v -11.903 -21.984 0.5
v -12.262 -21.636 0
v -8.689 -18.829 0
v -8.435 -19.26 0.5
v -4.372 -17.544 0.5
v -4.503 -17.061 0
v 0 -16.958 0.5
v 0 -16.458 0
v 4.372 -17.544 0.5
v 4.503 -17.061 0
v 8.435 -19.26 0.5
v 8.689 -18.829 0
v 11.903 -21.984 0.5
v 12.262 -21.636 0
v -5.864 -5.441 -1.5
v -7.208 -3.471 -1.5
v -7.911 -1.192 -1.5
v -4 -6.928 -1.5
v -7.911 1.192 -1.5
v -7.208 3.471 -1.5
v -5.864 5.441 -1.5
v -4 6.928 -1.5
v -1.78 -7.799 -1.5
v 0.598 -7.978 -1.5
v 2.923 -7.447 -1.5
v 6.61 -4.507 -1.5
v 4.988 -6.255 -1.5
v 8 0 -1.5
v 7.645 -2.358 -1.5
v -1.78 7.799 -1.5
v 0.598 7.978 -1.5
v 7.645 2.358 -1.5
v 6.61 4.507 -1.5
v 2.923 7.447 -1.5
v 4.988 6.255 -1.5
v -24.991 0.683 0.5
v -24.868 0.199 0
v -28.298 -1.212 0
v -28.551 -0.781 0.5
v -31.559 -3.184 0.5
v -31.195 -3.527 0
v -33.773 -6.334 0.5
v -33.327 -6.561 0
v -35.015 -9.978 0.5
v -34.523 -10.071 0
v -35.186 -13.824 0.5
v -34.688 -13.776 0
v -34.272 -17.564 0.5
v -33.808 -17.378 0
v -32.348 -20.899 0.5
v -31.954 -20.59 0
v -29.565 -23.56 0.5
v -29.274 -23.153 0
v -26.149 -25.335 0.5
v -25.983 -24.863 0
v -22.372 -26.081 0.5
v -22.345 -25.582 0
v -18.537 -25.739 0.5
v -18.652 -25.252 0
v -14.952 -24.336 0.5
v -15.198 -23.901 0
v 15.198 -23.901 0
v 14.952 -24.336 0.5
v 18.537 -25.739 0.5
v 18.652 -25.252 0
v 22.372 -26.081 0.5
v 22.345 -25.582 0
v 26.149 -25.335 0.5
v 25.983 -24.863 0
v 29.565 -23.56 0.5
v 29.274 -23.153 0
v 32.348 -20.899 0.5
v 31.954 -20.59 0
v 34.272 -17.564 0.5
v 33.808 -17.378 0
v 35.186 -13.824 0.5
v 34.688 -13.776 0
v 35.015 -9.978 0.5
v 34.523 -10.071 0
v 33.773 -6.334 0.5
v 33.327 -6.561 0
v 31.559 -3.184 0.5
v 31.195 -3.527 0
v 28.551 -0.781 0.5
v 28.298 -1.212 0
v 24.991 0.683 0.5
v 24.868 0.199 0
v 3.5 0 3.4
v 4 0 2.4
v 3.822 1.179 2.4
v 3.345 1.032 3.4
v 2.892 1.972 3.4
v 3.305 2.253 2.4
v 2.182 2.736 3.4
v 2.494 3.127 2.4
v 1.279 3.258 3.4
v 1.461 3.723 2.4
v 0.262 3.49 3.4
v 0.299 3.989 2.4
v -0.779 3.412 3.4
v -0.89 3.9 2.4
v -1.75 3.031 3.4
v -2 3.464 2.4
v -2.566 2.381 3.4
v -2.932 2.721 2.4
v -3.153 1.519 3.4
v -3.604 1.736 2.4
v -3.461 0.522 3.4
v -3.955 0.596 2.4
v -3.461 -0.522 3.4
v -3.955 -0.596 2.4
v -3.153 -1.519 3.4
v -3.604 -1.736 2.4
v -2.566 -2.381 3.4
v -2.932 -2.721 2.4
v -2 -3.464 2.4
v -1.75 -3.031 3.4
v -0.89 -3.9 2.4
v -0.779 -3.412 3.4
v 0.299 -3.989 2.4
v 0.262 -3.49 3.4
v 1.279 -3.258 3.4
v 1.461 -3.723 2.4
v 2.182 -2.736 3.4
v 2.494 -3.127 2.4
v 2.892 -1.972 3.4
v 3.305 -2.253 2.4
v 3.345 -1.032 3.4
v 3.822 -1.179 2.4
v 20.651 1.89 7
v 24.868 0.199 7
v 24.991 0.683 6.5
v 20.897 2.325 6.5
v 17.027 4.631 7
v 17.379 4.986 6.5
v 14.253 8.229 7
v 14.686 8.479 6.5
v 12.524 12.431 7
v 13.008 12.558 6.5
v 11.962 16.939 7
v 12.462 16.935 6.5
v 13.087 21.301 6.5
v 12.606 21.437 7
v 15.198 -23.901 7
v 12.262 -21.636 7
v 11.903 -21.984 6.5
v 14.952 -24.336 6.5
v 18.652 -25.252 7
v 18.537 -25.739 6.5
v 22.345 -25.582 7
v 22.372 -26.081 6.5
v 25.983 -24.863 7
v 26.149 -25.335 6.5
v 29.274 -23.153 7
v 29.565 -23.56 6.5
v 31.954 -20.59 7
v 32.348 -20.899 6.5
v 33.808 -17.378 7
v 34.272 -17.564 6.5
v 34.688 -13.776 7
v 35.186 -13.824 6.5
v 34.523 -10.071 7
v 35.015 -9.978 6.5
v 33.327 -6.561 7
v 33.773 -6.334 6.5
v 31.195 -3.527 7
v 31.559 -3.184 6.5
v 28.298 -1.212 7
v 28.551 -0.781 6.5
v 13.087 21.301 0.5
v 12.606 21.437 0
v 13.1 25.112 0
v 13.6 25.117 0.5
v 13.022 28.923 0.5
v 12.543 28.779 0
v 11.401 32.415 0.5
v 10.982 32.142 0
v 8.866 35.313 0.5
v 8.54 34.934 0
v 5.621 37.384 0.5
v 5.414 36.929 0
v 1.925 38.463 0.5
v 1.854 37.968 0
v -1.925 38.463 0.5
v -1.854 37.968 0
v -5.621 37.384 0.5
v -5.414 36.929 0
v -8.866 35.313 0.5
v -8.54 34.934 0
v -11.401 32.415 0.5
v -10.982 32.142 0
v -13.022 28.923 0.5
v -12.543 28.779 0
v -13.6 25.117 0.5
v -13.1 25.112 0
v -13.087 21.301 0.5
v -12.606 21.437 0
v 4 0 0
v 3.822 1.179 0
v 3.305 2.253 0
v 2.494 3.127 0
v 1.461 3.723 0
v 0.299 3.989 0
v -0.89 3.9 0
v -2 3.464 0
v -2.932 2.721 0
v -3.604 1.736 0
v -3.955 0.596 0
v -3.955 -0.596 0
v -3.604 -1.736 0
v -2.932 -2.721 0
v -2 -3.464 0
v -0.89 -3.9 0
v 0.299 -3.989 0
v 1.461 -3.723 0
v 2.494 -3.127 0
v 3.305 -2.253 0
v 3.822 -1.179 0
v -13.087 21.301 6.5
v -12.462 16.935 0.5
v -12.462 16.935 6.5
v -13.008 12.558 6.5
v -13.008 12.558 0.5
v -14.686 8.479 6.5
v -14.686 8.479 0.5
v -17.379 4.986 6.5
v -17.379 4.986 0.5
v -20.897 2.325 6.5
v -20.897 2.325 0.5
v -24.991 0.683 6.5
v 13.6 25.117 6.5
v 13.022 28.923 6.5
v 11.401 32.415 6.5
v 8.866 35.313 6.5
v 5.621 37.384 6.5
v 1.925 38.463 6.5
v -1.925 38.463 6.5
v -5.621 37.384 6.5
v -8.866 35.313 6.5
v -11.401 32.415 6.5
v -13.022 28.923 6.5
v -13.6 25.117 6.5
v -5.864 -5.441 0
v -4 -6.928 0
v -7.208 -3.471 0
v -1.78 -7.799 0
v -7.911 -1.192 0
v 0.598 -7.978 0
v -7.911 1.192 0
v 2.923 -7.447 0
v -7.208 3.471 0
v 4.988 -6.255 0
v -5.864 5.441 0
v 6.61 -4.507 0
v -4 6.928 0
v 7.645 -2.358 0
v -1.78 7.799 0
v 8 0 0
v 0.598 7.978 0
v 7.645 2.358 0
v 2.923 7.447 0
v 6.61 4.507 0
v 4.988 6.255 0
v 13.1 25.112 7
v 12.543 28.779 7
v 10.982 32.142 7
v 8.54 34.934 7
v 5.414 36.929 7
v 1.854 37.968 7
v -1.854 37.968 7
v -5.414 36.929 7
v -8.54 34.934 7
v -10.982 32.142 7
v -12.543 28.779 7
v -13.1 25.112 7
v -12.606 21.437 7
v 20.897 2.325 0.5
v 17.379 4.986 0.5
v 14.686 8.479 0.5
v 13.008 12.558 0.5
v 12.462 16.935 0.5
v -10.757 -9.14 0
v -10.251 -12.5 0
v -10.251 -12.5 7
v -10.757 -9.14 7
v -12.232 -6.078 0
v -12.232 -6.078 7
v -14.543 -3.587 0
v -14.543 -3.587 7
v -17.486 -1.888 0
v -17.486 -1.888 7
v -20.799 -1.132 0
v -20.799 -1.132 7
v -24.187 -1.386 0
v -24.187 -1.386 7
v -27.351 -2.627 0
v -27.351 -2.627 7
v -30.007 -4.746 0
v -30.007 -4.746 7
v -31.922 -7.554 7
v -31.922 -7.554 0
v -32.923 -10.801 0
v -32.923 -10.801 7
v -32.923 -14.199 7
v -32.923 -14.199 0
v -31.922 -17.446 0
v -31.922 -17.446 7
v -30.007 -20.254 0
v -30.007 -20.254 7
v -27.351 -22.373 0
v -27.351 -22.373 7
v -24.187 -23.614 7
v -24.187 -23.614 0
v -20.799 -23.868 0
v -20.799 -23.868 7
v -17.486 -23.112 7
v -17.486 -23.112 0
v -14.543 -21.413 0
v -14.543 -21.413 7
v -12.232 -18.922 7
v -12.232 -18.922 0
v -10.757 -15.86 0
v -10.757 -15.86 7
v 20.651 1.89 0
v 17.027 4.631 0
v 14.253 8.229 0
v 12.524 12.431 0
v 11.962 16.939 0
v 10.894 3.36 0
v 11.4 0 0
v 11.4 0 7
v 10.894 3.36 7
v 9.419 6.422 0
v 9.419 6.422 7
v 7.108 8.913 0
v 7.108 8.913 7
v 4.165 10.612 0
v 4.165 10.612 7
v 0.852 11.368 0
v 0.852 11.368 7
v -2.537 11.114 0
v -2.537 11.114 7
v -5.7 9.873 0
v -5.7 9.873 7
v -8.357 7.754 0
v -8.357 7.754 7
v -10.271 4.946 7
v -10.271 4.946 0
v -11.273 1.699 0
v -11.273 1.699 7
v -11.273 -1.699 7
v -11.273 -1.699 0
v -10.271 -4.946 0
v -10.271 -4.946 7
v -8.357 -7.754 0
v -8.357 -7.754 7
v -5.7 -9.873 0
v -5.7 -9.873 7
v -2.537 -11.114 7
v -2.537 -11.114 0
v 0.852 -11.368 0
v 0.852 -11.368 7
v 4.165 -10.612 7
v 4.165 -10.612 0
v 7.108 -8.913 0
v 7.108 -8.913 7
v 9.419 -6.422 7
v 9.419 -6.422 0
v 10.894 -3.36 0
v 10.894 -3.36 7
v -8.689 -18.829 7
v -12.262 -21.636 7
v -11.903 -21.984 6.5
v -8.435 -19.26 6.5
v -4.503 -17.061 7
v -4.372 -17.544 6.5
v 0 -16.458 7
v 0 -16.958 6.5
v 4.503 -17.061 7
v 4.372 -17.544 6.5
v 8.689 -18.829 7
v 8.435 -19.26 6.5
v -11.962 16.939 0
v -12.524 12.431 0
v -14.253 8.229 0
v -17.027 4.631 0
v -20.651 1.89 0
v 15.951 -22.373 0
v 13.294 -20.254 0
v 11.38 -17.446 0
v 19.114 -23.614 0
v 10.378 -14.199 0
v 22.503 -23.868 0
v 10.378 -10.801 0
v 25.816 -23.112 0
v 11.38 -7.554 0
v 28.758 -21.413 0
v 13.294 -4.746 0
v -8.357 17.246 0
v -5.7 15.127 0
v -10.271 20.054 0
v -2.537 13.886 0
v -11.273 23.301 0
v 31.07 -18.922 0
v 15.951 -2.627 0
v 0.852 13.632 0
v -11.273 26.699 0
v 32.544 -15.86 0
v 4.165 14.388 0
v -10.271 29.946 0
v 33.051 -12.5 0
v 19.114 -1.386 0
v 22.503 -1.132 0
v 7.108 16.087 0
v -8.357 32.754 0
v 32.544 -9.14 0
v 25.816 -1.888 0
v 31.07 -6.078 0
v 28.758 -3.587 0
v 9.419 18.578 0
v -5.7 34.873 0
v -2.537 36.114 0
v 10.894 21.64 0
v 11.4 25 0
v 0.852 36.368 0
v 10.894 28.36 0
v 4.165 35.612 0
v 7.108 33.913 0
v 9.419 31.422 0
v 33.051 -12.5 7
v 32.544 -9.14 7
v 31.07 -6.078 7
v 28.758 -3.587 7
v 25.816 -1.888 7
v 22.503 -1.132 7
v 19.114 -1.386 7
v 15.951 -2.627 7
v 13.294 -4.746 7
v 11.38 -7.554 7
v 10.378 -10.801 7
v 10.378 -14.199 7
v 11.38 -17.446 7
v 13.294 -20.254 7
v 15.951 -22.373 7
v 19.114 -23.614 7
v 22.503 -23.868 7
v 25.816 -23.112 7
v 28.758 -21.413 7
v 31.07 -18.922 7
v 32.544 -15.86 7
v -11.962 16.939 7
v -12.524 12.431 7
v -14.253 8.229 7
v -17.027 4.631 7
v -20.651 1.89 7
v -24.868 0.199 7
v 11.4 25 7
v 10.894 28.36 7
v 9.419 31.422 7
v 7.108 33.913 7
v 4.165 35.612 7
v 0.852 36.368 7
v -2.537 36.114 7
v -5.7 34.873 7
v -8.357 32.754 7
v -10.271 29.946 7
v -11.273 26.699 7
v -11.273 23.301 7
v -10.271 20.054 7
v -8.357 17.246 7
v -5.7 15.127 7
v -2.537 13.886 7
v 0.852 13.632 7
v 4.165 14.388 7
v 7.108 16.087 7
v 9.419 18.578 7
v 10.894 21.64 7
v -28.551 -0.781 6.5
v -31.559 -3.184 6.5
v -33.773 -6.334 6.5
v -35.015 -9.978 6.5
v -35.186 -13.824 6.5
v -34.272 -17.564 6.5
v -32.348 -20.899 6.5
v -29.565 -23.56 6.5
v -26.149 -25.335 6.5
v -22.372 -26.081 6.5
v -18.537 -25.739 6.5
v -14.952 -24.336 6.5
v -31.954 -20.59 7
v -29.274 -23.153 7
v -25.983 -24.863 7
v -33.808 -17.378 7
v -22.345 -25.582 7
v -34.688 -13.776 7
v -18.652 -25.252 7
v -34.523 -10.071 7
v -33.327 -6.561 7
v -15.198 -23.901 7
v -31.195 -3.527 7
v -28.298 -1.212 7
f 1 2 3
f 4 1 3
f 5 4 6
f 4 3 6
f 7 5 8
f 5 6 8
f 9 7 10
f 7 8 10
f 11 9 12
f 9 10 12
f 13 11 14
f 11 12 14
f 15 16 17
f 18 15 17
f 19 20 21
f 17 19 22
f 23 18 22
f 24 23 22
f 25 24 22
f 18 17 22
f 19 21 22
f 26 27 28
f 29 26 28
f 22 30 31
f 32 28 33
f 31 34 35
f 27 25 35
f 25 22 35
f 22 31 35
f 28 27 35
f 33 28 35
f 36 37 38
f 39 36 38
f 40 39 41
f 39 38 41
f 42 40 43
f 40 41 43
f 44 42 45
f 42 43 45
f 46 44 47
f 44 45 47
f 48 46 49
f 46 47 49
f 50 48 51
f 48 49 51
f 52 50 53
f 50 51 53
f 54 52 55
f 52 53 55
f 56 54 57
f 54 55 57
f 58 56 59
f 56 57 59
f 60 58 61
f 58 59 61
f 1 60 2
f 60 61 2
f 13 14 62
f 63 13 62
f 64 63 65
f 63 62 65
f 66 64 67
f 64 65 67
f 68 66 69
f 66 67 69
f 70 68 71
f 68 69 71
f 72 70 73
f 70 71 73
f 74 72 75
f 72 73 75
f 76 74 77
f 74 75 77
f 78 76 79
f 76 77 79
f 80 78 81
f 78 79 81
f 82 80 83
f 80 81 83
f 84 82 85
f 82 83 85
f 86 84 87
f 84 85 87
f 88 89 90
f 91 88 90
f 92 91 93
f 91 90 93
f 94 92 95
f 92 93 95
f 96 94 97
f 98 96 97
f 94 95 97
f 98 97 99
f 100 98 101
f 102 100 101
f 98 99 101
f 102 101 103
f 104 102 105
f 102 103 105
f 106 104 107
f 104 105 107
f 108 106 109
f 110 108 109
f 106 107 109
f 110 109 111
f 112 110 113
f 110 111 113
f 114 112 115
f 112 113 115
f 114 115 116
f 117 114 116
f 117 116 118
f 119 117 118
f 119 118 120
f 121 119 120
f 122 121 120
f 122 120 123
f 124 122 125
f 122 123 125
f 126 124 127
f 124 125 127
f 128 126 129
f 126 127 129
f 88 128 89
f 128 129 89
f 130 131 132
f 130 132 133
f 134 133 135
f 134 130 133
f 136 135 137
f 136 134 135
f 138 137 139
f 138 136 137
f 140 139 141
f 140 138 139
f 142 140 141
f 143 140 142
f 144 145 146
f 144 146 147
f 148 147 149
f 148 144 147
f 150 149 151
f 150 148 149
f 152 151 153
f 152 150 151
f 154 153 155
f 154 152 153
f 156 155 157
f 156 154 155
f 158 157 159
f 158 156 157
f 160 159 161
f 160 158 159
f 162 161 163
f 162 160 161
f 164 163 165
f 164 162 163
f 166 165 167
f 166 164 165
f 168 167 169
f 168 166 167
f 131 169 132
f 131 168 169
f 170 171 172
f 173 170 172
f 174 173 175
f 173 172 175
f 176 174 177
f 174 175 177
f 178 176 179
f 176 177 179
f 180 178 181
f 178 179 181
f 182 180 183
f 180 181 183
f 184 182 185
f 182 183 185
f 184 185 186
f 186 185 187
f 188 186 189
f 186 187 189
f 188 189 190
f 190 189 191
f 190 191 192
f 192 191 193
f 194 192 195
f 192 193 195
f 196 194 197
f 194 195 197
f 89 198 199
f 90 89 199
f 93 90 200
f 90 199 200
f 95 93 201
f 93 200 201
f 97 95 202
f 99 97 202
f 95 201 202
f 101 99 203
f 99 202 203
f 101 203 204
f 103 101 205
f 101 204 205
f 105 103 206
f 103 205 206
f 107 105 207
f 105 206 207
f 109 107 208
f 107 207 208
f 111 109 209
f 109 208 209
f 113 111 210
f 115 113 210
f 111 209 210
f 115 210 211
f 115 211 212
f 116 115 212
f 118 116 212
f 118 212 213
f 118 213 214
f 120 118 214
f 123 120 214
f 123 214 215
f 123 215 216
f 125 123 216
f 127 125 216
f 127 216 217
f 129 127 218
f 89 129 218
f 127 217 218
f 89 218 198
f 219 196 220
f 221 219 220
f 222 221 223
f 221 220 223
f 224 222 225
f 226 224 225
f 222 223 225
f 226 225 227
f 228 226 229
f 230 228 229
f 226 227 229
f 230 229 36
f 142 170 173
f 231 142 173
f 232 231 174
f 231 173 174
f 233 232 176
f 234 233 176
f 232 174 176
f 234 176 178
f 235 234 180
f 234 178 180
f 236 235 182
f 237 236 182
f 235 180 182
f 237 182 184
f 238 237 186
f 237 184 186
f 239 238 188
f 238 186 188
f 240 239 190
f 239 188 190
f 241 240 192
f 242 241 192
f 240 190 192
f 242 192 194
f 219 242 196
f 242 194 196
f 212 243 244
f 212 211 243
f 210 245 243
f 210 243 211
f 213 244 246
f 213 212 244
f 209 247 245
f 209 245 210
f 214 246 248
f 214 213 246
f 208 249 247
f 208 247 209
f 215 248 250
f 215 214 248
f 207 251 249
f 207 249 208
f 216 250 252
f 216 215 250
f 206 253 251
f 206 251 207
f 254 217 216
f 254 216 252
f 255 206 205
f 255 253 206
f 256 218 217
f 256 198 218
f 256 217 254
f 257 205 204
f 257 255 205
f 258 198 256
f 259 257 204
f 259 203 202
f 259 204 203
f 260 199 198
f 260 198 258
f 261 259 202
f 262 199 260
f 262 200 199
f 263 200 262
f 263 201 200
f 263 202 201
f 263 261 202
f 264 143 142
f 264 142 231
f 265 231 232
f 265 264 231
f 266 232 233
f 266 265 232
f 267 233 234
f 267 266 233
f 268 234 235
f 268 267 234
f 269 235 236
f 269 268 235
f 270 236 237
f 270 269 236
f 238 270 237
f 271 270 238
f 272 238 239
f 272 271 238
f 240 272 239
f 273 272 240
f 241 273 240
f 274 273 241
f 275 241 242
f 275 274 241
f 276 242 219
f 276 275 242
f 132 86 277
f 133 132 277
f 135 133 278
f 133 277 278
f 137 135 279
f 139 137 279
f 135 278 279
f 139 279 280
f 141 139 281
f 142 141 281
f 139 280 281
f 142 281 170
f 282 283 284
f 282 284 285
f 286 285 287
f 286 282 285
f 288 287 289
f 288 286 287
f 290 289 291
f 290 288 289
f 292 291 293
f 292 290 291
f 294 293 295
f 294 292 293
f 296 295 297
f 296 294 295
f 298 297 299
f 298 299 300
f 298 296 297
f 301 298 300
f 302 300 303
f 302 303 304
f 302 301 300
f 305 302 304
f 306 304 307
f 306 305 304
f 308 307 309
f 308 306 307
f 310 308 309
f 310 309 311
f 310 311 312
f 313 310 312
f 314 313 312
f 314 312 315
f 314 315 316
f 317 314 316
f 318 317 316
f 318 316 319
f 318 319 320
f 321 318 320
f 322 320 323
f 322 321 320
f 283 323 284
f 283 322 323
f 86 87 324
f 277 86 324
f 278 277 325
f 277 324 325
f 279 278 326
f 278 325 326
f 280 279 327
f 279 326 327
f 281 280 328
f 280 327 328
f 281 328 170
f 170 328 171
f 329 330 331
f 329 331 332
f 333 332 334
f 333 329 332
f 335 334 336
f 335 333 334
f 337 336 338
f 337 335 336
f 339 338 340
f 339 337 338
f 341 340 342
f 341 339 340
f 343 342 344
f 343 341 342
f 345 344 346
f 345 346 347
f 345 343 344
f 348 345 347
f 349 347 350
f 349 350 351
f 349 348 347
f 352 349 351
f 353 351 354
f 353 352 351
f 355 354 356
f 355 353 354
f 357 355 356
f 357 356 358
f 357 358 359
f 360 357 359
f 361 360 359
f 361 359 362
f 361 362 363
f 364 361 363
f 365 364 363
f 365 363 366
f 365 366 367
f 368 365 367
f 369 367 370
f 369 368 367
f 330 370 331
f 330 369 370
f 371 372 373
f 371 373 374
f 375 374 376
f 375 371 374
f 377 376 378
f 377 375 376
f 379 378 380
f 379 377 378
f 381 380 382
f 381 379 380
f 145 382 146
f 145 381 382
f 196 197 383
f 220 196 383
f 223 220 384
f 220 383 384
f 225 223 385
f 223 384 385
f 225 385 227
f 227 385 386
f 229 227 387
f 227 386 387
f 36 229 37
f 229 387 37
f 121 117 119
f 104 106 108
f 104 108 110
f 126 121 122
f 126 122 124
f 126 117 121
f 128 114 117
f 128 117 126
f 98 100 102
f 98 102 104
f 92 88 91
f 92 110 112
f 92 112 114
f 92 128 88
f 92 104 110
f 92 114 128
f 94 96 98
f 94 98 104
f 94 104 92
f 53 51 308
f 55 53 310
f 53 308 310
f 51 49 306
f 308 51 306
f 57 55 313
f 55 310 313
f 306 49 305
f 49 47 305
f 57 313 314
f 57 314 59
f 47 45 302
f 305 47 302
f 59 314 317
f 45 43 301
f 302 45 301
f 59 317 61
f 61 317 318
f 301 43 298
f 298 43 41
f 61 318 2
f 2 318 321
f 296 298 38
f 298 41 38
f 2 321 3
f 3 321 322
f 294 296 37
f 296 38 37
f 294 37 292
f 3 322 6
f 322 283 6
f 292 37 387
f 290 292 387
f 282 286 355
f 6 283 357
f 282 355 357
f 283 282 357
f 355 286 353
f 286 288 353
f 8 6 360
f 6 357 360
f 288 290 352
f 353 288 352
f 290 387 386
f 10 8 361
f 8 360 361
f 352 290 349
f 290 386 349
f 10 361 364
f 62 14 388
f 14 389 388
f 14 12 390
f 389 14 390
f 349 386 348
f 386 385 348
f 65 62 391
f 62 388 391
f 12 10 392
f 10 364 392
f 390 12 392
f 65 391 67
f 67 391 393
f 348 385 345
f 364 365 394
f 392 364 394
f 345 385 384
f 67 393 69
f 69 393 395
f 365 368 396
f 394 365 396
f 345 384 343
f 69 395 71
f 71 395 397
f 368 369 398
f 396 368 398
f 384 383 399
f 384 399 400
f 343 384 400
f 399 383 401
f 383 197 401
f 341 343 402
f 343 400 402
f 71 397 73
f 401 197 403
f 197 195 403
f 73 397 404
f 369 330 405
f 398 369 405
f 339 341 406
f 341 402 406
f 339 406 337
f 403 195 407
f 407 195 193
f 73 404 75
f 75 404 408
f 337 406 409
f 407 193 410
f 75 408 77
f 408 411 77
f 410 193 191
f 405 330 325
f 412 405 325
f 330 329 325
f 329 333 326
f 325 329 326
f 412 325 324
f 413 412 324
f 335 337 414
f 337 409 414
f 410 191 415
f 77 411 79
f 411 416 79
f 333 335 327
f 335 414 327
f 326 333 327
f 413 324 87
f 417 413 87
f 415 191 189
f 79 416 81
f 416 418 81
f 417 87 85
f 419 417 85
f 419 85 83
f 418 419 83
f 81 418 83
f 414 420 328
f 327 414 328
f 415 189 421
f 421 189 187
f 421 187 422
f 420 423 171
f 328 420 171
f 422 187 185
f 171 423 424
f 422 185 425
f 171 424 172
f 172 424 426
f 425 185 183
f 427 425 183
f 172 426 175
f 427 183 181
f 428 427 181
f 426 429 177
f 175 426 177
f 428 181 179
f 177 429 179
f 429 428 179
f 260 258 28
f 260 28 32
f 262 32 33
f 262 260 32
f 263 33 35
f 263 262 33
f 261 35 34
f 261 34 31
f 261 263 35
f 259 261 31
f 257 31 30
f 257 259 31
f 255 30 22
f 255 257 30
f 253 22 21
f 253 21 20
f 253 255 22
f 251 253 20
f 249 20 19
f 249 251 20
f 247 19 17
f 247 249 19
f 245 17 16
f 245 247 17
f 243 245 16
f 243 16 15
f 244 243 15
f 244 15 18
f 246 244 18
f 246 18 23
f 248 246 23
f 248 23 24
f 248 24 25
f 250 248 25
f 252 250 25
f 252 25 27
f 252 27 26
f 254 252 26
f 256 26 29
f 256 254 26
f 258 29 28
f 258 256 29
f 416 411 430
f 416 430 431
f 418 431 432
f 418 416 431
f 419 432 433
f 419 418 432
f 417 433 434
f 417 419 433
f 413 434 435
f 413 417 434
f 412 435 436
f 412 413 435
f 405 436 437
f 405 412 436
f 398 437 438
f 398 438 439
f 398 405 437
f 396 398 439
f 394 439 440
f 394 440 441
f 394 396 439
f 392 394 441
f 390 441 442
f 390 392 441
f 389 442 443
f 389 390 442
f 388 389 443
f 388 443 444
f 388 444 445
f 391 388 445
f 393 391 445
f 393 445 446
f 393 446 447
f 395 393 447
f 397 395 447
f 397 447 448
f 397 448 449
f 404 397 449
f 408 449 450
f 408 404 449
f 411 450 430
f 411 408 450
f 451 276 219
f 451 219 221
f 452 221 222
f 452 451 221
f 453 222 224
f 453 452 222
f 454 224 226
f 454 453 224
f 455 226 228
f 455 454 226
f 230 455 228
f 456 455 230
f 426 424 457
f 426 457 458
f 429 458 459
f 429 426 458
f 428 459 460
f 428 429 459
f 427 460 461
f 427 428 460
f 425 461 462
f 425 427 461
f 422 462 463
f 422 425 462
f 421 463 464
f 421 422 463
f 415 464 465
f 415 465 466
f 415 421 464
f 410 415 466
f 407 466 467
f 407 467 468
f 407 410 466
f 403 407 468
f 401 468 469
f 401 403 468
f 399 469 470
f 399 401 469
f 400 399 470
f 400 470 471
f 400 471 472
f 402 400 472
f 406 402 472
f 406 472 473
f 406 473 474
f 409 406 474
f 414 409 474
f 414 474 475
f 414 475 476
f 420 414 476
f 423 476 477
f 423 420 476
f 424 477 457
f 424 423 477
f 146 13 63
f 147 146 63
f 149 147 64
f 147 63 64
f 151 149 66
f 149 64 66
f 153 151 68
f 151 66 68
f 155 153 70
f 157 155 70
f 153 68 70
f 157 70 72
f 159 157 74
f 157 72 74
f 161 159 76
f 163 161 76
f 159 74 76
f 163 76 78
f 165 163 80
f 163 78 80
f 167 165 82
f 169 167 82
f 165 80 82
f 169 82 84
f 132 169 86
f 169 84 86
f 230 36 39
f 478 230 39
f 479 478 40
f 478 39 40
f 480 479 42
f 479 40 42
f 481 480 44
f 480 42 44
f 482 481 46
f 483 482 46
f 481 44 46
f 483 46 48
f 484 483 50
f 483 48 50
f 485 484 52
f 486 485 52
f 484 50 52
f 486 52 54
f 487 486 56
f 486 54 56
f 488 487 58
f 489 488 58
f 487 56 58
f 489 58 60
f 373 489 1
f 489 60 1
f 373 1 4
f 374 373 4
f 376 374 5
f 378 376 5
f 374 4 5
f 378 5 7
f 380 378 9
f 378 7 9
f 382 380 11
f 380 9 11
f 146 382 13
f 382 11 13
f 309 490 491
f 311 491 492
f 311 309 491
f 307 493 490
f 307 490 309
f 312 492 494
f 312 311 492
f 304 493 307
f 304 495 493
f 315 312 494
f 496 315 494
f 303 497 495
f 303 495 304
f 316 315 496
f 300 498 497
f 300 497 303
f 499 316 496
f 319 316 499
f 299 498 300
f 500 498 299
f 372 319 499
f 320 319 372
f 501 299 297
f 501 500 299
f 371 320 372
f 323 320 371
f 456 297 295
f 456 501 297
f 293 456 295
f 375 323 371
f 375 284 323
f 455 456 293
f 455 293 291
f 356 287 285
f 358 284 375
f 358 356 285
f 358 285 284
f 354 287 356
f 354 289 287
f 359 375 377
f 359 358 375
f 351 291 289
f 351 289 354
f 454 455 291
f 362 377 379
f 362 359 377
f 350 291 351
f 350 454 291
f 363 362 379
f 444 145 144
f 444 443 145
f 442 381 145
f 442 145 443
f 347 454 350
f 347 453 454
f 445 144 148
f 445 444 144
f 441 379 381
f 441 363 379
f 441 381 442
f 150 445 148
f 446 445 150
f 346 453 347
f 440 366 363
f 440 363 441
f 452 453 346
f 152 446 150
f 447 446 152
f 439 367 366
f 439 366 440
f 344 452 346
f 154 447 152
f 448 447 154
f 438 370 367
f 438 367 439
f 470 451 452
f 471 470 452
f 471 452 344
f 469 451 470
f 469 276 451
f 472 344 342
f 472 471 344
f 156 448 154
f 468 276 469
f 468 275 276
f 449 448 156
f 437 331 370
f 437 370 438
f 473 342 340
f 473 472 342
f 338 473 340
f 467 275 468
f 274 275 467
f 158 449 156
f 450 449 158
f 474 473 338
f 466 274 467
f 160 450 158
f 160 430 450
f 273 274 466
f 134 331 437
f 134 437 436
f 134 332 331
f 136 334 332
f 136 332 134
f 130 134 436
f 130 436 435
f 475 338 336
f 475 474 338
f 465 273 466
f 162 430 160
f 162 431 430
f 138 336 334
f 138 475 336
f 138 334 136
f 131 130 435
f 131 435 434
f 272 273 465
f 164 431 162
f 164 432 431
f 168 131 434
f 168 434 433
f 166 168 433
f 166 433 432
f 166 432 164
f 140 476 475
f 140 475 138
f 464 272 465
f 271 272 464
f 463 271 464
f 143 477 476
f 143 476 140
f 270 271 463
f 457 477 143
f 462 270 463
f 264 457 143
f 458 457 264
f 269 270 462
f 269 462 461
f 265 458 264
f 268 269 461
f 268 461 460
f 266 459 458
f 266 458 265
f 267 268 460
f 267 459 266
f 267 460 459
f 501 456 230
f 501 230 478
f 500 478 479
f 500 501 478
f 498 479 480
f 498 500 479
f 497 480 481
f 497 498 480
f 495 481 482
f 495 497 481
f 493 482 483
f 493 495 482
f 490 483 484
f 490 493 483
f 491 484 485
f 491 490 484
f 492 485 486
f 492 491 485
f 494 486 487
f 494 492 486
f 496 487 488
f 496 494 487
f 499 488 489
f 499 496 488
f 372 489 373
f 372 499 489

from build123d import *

# Parameters (mm, degrees)
F0_R     = 11.4
F1_DEPTH = 7
F2_R     = 8
F2_R_2   = 4
F3_DEPTH = 1.5
F4_DEPTH = 3.4
F5_SIZE2 = 1
F5_SIZE  = 0.5
F6_SIZE  = 0.5


with BuildPart() as f1:
    # F0 (on Top) → F1 (new body)
    with BuildSketch(Plane.XY):
        with BuildLine():
            ThreePointArc((-11.9034126116, -21.9842845733), (0, -16.9581287631), (11.9034126116, -21.9842845733))
            ThreePointArc((11.9034126116, -21.9842845733), (33.4285805861, -19.3), (24.9906552303, 0.6834845733))
            ThreePointArc((24.9906552303, 0.6834845733), (14.6861703095, 8.4790643815), (13.0872426187, 21.3008))
            ThreePointArc((13.0872426187, 21.3008), (0, 38.6), (-13.0872426187, 21.3008))
            ThreePointArc((-13.0872426187, 21.3008), (-14.6861703095, 8.4790643815), (-24.9906552303, 0.6834845733))
            ThreePointArc((-24.9906552303, 0.6834845733), (-33.4285805861, -19.3), (-11.9034126116, -21.9842845733))
        make_face()
        with Locations((-21.6506350946, -12.5)):
            Circle(F0_R, mode=Mode.SUBTRACT)
        with Locations((21.6506350946, -12.5)):
            Circle(F0_R, mode=Mode.SUBTRACT)
        Circle(F0_R, mode=Mode.SUBTRACT)
        with Locations((0, 25)):
            Circle(F0_R, mode=Mode.SUBTRACT)
    extrude(amount=F1_DEPTH)

    # F6
    f6_edges = [f1.edges().sort_by_distance(p)[0] for p in [
        (0, -16.958129, 0),
        (0, -16.958129, 7),
    ]]
    chamfer(f6_edges, length=F6_SIZE)


with BuildPart() as f3:
    # F2 (on Top) → F3 (new body)
    with BuildSketch(Plane.XY):
        Circle(F2_R)
        Circle(F2_R_2, mode=Mode.SUBTRACT)
        Circle(F2_R_2)
    extrude(amount=-F3_DEPTH)

    # F2 (on Top) → F4 (join)
    with BuildSketch(Plane.XY):
        Circle(F2_R_2)
    extrude(amount=F4_DEPTH)

    # F5
    f5_edges = [f3.edges().sort_by_distance(p)[0] for p in [
        (-4, 0, 3.4),
    ]]
    f5_side = f3.faces().sort_by_distance((0, 0, 3.4))[0]
    chamfer(f5_edges, length=F5_SIZE, length2=F5_SIZE2, reference=f5_side)


solid = Compound([f1.part, f3.part])
